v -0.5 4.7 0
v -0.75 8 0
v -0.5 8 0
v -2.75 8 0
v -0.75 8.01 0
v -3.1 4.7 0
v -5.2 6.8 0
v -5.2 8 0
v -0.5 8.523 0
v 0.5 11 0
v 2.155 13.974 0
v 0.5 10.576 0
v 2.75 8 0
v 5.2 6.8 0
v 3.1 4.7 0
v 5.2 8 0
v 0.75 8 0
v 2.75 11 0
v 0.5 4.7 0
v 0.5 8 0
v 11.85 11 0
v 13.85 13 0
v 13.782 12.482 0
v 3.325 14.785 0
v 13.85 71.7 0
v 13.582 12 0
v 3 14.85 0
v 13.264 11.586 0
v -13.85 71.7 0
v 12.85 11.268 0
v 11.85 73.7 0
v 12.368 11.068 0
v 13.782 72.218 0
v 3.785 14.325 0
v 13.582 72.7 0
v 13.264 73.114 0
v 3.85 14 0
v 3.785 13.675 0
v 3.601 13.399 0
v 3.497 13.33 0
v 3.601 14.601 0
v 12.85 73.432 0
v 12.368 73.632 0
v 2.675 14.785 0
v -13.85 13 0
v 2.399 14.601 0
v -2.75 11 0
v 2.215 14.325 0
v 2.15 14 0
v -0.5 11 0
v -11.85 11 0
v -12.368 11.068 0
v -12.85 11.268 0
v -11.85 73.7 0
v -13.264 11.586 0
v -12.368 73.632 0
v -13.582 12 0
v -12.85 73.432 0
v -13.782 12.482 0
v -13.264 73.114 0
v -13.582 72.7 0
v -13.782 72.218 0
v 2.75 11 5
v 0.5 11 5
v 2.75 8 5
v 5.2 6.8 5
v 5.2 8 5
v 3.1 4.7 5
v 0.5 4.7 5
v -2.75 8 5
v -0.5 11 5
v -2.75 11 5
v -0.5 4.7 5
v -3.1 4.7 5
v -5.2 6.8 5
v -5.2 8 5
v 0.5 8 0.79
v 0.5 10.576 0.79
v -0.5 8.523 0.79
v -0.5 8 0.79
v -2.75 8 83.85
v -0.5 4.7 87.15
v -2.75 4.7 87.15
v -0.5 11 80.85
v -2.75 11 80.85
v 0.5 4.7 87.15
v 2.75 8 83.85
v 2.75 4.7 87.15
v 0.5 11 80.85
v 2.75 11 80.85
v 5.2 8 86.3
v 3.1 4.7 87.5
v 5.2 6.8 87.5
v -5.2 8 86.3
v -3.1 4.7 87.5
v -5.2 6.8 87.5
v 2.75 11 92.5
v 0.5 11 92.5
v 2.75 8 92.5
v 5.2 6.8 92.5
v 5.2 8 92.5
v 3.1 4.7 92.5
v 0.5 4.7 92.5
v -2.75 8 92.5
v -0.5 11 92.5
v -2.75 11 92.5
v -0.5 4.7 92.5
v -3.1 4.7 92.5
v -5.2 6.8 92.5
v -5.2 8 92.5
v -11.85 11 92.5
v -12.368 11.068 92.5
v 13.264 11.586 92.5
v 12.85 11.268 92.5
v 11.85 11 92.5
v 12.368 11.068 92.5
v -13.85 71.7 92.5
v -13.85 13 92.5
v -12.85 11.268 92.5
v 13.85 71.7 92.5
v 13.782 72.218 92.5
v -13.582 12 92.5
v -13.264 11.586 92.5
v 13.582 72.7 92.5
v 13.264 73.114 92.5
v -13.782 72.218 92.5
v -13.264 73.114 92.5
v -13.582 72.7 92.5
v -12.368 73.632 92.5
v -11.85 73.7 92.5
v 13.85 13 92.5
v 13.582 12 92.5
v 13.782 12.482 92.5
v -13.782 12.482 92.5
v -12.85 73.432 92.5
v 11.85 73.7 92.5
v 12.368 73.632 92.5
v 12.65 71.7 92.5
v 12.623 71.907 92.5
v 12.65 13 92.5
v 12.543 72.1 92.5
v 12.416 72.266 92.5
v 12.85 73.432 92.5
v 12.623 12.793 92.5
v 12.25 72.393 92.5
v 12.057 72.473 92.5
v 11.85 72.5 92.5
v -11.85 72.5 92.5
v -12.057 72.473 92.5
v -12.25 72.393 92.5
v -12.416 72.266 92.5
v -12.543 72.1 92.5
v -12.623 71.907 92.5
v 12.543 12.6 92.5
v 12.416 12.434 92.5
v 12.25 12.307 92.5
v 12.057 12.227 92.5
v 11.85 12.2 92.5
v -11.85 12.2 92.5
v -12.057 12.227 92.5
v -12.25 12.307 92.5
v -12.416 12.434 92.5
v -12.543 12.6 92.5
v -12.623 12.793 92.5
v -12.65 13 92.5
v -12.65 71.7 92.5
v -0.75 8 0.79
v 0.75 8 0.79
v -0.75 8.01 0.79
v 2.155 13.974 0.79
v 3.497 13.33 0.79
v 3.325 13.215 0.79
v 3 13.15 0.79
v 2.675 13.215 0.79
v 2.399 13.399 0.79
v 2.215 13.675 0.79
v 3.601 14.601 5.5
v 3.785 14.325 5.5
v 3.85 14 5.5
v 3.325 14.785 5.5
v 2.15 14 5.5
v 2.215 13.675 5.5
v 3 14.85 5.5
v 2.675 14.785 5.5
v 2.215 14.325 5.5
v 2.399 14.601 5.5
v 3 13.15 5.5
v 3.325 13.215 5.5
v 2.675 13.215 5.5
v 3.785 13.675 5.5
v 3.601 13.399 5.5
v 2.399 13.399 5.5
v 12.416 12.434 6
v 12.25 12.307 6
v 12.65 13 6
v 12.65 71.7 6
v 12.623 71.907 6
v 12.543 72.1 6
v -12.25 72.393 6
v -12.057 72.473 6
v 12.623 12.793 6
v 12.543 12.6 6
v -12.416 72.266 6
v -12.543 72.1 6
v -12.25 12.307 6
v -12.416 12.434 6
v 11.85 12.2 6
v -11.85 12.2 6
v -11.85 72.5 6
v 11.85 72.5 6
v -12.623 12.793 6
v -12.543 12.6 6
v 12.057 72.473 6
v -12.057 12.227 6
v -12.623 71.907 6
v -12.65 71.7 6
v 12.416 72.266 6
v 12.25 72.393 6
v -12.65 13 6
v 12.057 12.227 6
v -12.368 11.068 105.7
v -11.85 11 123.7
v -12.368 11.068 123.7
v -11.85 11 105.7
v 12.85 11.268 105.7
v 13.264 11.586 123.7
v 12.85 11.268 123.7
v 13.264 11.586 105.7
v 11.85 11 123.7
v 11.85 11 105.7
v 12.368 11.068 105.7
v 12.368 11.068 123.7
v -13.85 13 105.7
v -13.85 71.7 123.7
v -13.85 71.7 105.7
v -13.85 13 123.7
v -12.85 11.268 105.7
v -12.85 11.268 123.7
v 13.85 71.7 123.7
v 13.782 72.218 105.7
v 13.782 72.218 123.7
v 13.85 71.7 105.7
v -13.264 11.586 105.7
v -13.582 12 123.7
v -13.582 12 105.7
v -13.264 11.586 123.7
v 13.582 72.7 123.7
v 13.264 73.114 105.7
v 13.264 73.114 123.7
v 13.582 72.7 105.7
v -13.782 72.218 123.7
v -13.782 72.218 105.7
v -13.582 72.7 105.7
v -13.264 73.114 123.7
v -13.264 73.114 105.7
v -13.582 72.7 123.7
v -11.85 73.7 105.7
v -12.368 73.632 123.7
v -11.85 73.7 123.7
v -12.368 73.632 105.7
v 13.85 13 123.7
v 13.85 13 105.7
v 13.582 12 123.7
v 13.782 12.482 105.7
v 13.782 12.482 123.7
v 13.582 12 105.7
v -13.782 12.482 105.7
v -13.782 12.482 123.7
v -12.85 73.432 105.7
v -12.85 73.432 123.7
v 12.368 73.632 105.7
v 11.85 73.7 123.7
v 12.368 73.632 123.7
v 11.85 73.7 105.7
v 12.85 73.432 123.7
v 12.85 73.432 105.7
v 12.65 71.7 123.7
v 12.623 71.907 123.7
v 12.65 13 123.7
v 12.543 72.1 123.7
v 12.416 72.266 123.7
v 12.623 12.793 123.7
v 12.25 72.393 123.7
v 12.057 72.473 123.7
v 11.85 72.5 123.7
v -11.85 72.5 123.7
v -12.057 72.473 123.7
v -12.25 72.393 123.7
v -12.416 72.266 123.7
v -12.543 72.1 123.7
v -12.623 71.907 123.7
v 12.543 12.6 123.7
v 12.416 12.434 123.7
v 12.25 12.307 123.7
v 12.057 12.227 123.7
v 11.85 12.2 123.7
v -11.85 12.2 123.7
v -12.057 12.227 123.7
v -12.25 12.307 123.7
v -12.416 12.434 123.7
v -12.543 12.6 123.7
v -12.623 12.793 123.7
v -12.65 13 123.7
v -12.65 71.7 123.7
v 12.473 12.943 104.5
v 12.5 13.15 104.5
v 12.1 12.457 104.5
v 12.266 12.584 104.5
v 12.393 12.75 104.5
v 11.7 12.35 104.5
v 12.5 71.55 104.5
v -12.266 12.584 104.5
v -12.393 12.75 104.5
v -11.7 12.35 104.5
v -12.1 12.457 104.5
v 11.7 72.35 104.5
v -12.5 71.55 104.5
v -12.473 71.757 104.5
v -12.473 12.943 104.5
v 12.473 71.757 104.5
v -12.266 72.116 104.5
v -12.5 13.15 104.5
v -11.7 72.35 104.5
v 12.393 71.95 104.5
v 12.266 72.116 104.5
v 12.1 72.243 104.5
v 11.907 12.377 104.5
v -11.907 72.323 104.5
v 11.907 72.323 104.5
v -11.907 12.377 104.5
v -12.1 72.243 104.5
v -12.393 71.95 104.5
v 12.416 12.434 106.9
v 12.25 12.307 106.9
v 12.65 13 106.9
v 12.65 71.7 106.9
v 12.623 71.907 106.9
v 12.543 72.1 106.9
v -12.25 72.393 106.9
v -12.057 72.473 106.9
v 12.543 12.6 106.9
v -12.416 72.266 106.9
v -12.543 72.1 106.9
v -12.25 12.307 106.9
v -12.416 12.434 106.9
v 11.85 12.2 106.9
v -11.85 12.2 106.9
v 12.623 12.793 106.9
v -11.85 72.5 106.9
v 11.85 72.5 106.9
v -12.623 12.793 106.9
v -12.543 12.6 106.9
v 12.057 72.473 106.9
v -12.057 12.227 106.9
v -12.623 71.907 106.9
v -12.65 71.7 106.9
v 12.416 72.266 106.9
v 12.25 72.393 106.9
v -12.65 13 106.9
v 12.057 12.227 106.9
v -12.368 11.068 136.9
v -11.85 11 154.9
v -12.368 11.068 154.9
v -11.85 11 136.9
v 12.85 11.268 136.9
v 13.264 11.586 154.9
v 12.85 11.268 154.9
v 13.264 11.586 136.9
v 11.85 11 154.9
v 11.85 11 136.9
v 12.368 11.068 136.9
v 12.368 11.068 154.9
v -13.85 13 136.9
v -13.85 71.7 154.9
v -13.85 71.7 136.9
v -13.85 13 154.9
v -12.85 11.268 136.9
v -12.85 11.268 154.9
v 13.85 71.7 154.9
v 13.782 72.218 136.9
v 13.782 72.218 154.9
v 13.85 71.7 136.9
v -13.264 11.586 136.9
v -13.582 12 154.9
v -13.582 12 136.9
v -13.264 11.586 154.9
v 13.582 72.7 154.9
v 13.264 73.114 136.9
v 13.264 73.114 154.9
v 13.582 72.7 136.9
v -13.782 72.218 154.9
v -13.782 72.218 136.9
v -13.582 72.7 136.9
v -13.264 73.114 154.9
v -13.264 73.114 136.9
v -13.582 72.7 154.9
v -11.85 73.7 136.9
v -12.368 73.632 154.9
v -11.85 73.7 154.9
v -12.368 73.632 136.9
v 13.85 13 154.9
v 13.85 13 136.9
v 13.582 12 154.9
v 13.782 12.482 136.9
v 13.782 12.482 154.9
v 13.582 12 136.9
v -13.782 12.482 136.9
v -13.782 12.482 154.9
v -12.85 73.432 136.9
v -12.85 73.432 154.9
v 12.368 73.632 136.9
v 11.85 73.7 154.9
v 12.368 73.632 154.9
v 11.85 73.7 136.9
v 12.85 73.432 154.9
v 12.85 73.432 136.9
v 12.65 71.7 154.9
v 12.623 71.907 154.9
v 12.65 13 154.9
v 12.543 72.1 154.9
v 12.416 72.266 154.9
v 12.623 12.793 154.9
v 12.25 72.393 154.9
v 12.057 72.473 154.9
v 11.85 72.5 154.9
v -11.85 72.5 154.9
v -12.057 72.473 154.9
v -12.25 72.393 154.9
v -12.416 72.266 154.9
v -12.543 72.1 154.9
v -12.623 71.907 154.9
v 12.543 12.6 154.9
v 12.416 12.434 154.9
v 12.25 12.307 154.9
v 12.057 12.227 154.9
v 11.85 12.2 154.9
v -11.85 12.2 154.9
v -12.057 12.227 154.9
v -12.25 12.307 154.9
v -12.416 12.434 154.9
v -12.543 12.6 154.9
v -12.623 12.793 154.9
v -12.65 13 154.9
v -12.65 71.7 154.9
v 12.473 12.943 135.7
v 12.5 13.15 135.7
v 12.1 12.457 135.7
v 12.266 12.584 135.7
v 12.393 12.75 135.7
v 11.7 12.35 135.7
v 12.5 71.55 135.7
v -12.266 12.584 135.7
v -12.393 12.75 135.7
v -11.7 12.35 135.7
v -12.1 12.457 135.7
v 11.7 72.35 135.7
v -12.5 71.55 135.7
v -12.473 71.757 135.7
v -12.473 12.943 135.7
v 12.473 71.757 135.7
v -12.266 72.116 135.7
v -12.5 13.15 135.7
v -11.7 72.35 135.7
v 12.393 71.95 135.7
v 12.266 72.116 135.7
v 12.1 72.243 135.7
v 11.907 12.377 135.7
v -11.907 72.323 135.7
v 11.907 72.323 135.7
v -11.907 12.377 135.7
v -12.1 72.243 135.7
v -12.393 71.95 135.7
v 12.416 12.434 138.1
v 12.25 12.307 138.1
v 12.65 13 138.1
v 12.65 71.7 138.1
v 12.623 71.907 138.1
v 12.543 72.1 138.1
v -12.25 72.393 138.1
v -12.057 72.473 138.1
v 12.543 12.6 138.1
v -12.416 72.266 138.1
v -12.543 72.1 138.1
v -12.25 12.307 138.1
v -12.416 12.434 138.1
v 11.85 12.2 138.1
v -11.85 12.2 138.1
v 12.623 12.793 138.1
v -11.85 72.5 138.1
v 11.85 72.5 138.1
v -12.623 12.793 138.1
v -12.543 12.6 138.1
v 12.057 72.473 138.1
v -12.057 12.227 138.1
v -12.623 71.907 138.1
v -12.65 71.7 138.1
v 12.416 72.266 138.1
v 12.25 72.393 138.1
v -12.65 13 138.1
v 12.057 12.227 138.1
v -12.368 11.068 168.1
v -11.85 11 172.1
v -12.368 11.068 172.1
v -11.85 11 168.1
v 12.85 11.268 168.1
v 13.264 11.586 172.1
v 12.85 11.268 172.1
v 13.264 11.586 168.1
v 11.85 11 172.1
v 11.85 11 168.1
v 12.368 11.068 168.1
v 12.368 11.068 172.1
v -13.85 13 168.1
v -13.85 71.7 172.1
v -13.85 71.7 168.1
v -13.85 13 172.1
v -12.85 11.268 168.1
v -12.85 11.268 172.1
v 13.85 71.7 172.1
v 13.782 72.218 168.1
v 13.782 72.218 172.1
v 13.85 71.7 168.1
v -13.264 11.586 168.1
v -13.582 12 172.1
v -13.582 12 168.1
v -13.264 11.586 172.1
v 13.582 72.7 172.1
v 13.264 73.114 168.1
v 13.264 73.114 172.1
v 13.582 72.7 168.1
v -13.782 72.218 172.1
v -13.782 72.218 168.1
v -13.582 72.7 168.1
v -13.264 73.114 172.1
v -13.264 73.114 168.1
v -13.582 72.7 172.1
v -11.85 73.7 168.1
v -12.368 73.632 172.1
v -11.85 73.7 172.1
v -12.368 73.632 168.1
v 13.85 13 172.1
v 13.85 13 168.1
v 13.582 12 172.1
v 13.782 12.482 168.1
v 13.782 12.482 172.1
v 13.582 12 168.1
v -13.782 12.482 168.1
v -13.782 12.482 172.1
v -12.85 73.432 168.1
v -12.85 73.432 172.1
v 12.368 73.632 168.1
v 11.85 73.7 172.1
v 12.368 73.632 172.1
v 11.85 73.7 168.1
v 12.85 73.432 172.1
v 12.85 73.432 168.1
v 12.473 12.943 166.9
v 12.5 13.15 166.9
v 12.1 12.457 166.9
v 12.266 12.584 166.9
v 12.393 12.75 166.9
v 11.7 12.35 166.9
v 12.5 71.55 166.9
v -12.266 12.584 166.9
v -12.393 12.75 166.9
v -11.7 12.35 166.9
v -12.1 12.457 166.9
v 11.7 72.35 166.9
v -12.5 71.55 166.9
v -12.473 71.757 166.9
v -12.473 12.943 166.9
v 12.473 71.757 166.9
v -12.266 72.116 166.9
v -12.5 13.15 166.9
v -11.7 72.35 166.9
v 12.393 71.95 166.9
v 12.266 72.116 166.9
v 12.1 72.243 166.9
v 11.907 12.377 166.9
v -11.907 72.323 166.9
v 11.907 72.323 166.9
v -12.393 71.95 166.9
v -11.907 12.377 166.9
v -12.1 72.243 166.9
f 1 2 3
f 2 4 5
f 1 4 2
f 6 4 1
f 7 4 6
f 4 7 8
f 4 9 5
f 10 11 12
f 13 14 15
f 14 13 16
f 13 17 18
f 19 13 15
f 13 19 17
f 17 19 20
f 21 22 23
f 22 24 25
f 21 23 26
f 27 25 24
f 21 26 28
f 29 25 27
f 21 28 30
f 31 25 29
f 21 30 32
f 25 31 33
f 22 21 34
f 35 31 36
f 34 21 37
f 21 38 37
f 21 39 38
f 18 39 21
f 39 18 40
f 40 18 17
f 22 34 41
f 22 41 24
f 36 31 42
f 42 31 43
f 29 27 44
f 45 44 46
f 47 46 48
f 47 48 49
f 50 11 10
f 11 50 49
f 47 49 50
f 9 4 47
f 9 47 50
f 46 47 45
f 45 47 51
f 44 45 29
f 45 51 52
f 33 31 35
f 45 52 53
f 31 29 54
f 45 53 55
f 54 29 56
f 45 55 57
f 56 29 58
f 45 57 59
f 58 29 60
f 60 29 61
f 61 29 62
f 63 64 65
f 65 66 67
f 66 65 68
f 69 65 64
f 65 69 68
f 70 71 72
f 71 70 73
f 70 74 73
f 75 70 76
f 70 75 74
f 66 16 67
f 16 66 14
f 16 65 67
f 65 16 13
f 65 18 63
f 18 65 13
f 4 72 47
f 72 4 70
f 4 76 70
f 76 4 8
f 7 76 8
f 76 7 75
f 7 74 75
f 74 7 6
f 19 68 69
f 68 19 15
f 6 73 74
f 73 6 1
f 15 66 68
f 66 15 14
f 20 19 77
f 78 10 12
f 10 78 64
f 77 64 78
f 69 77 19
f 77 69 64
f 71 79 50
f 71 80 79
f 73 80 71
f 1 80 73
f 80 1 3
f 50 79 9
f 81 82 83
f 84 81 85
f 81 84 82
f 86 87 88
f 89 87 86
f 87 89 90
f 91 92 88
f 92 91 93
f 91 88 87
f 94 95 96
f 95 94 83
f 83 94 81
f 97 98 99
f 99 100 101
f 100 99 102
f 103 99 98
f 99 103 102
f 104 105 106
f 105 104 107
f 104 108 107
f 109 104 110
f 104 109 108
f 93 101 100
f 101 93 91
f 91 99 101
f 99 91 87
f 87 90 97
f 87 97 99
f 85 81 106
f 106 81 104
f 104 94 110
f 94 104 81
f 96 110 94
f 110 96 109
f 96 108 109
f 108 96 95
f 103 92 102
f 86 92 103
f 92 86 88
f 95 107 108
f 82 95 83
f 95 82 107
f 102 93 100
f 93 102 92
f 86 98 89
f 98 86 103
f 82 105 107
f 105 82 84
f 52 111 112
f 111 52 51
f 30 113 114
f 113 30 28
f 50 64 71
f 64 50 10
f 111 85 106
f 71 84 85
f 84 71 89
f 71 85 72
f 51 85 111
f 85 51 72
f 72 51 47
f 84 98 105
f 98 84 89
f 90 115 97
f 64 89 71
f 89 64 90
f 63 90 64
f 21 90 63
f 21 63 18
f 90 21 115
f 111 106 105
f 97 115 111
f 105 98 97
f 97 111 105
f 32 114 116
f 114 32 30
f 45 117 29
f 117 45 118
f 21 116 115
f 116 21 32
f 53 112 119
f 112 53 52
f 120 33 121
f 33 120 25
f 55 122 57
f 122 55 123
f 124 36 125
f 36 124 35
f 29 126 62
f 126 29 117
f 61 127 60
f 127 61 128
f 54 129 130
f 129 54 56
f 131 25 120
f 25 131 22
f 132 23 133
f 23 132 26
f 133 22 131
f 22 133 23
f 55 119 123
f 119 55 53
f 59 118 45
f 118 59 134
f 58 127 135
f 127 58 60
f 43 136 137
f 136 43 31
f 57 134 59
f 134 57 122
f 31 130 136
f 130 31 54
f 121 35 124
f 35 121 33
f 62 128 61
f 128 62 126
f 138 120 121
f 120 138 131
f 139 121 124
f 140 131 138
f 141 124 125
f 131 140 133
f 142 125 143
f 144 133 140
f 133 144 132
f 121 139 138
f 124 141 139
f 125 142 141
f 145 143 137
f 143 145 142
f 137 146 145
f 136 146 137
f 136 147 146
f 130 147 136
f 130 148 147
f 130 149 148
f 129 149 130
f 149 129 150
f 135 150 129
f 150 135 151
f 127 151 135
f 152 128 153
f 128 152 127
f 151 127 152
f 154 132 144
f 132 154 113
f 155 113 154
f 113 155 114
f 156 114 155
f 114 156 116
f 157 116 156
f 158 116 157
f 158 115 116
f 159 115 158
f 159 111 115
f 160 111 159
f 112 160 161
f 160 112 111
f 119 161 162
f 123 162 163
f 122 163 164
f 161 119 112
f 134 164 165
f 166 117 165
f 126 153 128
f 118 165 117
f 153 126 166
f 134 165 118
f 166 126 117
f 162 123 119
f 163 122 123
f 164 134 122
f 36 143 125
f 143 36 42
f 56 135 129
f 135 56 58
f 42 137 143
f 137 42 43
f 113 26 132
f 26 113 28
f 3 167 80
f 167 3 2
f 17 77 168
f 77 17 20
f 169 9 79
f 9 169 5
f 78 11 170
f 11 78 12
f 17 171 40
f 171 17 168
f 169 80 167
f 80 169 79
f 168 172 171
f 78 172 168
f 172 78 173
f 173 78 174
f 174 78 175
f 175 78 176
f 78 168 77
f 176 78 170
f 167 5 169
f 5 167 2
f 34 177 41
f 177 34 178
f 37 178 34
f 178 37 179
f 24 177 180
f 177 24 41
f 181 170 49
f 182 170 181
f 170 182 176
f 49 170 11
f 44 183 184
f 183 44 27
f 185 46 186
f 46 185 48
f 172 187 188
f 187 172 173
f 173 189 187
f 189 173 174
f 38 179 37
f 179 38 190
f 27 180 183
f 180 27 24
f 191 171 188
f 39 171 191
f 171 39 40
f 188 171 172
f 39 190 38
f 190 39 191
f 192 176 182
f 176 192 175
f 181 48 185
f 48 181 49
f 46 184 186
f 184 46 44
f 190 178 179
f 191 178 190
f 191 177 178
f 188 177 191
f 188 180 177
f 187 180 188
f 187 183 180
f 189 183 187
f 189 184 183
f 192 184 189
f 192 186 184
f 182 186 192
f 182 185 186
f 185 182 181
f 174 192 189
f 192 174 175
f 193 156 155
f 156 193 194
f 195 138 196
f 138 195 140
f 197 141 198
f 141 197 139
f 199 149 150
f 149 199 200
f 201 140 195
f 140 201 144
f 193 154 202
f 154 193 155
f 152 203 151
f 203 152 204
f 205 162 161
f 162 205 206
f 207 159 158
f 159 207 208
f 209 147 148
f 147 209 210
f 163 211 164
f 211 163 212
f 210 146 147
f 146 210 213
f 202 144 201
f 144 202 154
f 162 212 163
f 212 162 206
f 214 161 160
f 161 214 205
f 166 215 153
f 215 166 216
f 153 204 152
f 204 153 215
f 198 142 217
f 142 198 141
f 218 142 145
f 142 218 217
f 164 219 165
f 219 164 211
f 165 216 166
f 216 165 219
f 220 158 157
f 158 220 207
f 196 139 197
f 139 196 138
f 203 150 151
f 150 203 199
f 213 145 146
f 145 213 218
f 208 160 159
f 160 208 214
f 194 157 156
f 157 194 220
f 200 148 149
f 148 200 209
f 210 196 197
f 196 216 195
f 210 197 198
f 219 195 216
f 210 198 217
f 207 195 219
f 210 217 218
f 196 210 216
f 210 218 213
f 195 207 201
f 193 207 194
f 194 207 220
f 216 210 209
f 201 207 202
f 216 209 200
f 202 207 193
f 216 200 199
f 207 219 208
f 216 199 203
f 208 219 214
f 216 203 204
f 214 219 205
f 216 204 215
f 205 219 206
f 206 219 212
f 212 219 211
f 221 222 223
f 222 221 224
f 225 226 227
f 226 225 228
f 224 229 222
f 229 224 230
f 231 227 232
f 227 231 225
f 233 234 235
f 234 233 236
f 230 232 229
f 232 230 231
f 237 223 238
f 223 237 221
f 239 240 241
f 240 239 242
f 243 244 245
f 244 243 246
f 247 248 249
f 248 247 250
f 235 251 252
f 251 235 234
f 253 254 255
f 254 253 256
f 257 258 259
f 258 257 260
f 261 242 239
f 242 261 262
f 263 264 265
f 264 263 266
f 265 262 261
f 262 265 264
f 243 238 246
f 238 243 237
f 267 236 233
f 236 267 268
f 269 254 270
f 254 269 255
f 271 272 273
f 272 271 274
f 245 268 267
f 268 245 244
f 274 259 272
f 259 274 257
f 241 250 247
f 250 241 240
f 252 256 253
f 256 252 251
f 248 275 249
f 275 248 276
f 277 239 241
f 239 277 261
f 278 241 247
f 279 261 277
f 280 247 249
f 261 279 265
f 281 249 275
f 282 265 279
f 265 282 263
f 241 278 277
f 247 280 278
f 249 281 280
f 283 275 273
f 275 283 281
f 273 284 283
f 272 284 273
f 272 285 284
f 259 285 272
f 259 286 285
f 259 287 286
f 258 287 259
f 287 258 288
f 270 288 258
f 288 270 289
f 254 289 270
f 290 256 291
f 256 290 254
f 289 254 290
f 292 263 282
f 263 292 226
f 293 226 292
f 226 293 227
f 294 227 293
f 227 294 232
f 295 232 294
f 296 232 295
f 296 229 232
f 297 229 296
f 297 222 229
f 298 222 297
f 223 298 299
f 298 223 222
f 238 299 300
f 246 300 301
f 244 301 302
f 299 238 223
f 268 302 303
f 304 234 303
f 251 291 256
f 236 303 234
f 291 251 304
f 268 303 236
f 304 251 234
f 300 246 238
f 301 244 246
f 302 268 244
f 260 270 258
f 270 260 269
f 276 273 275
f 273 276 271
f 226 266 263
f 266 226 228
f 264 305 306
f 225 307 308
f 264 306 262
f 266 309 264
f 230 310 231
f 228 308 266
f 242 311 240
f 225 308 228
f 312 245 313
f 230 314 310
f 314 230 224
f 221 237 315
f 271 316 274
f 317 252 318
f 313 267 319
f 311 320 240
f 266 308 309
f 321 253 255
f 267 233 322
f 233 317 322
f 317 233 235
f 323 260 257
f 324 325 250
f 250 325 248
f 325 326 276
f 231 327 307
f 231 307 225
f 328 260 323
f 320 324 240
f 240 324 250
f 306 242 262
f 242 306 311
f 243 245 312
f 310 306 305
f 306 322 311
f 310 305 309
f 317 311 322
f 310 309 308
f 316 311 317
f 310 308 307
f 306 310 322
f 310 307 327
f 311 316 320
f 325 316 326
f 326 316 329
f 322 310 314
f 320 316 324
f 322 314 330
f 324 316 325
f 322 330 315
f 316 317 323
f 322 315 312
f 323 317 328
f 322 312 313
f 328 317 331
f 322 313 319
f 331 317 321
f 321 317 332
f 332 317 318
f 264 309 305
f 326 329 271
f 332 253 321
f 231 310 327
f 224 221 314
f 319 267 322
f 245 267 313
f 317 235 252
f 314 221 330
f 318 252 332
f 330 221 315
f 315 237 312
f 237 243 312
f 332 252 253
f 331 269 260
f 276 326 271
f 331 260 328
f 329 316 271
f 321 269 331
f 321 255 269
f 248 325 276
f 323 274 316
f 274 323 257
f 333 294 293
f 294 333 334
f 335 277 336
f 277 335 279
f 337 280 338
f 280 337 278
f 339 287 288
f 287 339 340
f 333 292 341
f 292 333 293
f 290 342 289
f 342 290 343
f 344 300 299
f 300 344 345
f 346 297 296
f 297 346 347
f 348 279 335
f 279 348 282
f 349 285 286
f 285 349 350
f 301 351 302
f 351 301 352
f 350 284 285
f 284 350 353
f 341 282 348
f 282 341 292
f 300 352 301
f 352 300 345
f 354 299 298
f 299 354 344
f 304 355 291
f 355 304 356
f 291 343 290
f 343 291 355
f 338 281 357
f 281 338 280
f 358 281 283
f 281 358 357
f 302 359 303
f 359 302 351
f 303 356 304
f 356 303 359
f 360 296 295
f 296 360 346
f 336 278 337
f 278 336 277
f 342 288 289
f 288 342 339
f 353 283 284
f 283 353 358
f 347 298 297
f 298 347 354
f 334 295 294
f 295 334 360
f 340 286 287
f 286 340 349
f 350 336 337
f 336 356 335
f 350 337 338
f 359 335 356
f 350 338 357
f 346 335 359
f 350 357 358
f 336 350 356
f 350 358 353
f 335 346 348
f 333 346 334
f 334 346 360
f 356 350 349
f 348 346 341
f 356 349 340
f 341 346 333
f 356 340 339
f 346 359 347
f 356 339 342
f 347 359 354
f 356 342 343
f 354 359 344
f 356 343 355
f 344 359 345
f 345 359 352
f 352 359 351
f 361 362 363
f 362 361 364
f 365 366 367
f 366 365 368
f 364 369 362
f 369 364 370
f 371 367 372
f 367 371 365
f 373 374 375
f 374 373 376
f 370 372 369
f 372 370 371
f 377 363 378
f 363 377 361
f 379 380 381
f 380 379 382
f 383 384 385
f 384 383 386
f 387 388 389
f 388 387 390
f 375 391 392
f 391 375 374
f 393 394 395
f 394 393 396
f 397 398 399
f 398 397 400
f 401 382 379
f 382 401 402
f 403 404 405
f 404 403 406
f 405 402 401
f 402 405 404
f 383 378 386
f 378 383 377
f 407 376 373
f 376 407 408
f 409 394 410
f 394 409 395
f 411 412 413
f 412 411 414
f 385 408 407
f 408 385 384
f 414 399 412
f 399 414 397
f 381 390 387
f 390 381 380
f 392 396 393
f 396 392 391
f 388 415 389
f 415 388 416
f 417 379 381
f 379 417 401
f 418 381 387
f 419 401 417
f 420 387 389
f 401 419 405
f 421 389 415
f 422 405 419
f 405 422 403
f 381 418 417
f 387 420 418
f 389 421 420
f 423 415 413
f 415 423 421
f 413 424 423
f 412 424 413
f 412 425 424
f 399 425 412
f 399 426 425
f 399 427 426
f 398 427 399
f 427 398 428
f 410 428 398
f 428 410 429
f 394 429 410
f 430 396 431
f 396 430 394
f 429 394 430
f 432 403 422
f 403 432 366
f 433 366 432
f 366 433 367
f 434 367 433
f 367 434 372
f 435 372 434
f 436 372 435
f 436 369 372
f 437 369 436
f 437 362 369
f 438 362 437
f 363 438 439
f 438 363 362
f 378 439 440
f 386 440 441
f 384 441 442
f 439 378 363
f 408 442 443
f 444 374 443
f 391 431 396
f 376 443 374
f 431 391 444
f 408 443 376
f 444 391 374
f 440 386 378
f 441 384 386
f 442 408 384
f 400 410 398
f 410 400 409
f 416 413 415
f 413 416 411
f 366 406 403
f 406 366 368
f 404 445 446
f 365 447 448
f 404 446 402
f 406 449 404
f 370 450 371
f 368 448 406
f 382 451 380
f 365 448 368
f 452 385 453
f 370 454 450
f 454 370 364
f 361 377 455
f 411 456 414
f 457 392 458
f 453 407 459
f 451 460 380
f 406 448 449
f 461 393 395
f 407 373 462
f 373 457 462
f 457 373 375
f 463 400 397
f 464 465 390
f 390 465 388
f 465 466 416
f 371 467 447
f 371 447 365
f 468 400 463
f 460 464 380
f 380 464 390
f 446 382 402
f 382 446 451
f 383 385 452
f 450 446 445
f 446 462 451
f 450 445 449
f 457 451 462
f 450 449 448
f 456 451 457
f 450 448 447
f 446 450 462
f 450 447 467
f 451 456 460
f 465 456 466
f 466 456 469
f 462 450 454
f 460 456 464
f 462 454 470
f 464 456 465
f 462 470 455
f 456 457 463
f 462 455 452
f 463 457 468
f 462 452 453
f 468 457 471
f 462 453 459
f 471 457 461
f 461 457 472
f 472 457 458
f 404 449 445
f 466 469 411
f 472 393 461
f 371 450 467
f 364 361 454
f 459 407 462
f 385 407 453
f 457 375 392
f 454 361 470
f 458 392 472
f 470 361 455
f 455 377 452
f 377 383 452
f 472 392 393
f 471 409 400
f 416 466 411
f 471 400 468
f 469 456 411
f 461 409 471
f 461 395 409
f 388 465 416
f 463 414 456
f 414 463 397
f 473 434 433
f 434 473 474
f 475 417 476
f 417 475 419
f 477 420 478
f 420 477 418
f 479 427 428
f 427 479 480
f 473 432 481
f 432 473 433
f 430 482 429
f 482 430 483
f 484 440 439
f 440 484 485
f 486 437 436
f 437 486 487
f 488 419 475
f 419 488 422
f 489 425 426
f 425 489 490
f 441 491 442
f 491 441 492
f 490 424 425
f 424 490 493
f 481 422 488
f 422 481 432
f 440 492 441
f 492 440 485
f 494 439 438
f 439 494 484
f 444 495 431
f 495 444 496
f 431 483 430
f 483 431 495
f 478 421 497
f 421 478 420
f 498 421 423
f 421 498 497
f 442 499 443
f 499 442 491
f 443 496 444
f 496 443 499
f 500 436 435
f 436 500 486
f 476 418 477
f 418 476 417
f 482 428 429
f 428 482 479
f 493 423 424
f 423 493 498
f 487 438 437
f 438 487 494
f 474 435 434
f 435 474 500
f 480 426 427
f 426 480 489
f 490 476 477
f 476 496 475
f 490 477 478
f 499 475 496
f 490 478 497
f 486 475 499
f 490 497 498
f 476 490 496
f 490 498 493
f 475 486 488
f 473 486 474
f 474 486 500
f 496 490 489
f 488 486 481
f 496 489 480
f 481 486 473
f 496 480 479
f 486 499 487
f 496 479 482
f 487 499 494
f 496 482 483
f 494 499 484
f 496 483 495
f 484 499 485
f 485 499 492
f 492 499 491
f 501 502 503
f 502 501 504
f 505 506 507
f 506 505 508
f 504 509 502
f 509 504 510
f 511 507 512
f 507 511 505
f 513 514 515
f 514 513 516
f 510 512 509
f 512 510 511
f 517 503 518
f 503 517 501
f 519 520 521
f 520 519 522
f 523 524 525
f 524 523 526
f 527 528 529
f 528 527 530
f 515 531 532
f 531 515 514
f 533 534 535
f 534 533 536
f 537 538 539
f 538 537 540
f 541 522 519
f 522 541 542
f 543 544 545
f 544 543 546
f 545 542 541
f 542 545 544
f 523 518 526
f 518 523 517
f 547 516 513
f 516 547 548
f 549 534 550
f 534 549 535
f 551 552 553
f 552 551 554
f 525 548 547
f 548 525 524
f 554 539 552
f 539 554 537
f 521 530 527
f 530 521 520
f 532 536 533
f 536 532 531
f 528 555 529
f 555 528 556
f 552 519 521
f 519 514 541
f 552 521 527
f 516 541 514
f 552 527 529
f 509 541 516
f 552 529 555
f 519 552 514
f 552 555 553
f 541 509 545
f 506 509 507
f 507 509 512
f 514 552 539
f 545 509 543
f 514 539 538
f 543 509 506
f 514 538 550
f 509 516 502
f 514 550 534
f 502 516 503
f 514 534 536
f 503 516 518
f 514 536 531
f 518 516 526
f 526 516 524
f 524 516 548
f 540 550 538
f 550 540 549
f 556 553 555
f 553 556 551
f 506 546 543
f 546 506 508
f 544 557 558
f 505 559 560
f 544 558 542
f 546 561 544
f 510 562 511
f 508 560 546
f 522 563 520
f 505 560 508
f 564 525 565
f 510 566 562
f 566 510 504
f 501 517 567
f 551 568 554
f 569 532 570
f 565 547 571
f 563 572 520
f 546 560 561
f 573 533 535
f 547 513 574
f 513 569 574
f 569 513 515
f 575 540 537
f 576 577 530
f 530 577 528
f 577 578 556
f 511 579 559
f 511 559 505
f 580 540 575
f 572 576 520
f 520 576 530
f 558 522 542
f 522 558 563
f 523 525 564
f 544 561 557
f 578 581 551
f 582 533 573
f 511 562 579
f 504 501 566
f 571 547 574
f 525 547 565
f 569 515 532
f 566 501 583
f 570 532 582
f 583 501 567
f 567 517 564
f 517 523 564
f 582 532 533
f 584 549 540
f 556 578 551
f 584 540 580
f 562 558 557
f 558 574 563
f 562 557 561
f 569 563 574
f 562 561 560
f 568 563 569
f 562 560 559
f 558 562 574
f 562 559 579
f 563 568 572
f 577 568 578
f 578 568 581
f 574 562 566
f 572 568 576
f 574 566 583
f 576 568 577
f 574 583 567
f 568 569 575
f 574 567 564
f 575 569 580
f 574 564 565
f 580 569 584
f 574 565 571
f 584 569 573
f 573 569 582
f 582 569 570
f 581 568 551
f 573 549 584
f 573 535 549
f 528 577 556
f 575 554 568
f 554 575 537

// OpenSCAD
// file: vslot-2020.scad
// OpenBuilds V-Slot 20x20, millimetres.
// Source: ../../datasheets/openbuilds-vslot-20x20.pdf, page 1.
// Open directly for a short inspection sample; `use` for library modules.
sample_length = 60;
section_only = false;

module vslot_2020_profile(corner_radius=0.5, centre_notch=0.2) {
    // Dimensioned features from drawing.
    half_size = 10;
    mouth_half = 9.16/2;
    throat_half = 6.25/2;
    channel_half = 11/2;
    shoulder_y = half_size - 1.80;
    floor_y = shoulder_y - 4.30;
    // 90-degree V: each face has a 45-degree slope.
    throat_y = half_size - (mouth_half-throat_half);
    // Adjacent diagonal cavity walls straddle y=x. Their normal
    // separation is the specified 1.50 mm web thickness.
    diagonal_offset = 1.50/sqrt(2);
    channel_knee_y = channel_half + diagonal_offset;
    floor_half = floor_y - diagonal_offset;

    // Corner radius and tiny floor-centre notch are visually estimated:
    // the PDF depicts them but does not dimension them.
    difference() {
        offset(r=corner_radius,$fn=24)
            square([20-2*corner_radius,20-2*corner_radius],center=true);
        circle(d=4.20,$fn=64);
        for(a=[0:90:270]) rotate(a)
            polygon([
                [-mouth_half,11], [mouth_half,11],
                [mouth_half,half_size], [throat_half,throat_y],
                [throat_half,shoulder_y], [channel_half,shoulder_y],
                [channel_half,channel_knee_y], [floor_half,floor_y],
                [centre_notch,floor_y], [0,floor_y-centre_notch],
                [-centre_notch,floor_y], [-floor_half,floor_y],
                [-channel_half,channel_knee_y], [-channel_half,shoulder_y],
                [-throat_half,shoulder_y], [-throat_half,throat_y],
                [-mouth_half,half_size]
            ]);
    }
}

module vslot_2020(length=500) {
    assert(length>0,"Rail length must be positive");
    linear_extrude(height=length,convexity=10) vslot_2020_profile();
}

if(section_only) vslot_2020_profile();
else color([0.66,0.71,0.75]) vslot_2020(sample_length);
// main file
// Load stack, v7: a master load on the end of the balance line, add-on cells
// on top of it, a lid on top of those, hanging directly behind the spine and
// riding its rear T-slot on two flanged sliders. No guide lines: Matt tried
// them on the rig, 2026-09-19, and no tension competes with the mass.
//
// The master is a thin sleeve round Matt's lead-in-resin block, 25 x 60 x 85
// (insert), or two side by side (insert_n = 2); use_insert = false gives a
// shot box. Every piece is an OPEN box closed by the piece above, which has
// a chamfered foot that drops into the cavity below.
//
// The rail guides the master. Its body stands 1 mm off the rail's rear face,
// and a T slider is attached straight to the front wall at the top and at the
// bottom, 5 mm tall each: a stem through the slot's 6 mm opening and a head
// in the channel behind the lips, slit down the middle so the load line runs
// straight through. Both slide in from the rail's top end, before the spine
// cap goes on. The top one overhangs the wall by 6.3 mm, so its underside is
// tapered at 45 degrees (Matt, 2026-09-20): from the wall out to the tip in y,
// and from the stem's sides out to the head's edges in x, added together, so
// every point of the underside has material within 45 degrees below it and it
// prints with no support. The taper hangs under the 5 mm that captures; it
// bears nothing. The line runs down inside the channel,
// through both slits, out under the master, along a channel in the floor's
// underside to an M2 and is clamped under its head. The master's floor is
// thick enough to hold the screw, which is the only height this costs.
//
// Default view is the pieces in a column with gaps, bottom to top: master,
// cells, lid.
part = "column";   // [column, master, cell, lid, print, stack, test, slide]
// test: one T slider on a short slab, with the line hole and the M2 clamp.
test_d     = 12;
test_w     = 20;
// slide: a T slider slide_h tall on a handle, nothing else, for the sliding
// fit up and down the channel. Prints standing, so the section is true.
slide_h    = 20;
slide_handle = 6;    // behind the front face

rail       = 20;
// Slot numbers as printed and proven: the master's sliders fit and slide on
// the V-slot, 2026-09-20 (Matt: a little white grease). spine-cap.scad has the
// same numbers. The datasheet's V-slot is 6.25 at the throat, 6.1 to the
// floor; the fit rides on the stem and has clearance everywhere else, so the
// difference is not material. Do not retune.
slot_w     = 6.0;    // opening at the face
lip_t      = 1.8;    // face to the underside of the lip
chan_w     = 11;     // channel width just behind the lips
chan_str   = 1.6;    // how far below the lips the channel stays full width, before it angles in at 45
chan_d     = 5.5;    // face to the floor
spine_clr  = 1.0;    // front face to the rail's rear face

use_insert = true;
insert     = [25, 60, 85];   // the block: across, deep, tall
insert_n   = 1;              // blocks side by side across
insert_clr = 0.3;            // total, on each of the three
shot_w     = 40;             // the shot-filled master's section instead
shot_d     = 60;
shot_h     = 80;

slider_h   = 5;      // the top slider: capture only, not a guide
slider_h_bot = 5;    // the bottom slider
top_taper  = true;   // 45 degree underside on the top slider instead of support
cell_h     = 18;
cells      = 2;      // in the column and stack views
lid_t      = 4;
wall       = 1.2;    // three 0.4 mm perimeters
floor_t    = 1.2;    // cells
master_floor = 6;    // the master: holds the M2
foot_h     = 1.2;    // into the cavity below; its 45 degree flare is the wall
foot_clr   = 0.15;   // a side
corner     = 2;

// The T slider.
stem_w     = slot_w - 0.5;   // through the opening, 0.25 a side
head_w     = chan_w - 0.6;   // in the channel, 0.3 a side
head_clr   = 0.2;            // under the lips, and off the floor
slider_slit = 1.0;           // down the middle of each slider, for the line
tie_y      = 14;     // the M2, from the rail centre, up into the master's floor
tie_x      = 3;      // off centre, clear of the slit
m2_hole    = 1.7;    // M2 forms its own thread in PLA
m2_depth   = 5.5;    // a 5 mm screw
channel_w  = 1.5;    // the line across the trap's face, hole to screw
channel_d  = 0.8;
gap        = 12;     // between pieces in the column
$fn = 48;

shot_steel = 4.6; shot_lead = 6.8;
front_y  = rail/2 + spine_clr;
stem_in  = rail/2 - lip_t - head_clr;         // stem reaches to just under the lips
knee_in  = rail/2 - lip_t - chan_str + head_clr;   // where the channel starts angling in
head_in  = rail/2 - chan_d + head_clr;        // head reaches to just off the floor
head_bot = head_w - 2*(knee_in - head_in);    // width at the bottom after the 45 degree taper
line_y   = stem_in;                           // hole centred on the junction
// The taper's height: the underside is z = (front_y - y) + max(0, |x| - stem_w/2),
// highest at the head's outer knees and at its floor corners.
taper_h  = top_taper ? max(front_y - knee_in + (head_w - stem_w)/2, front_y - head_in + (head_bot - stem_w)/2) : 0;
stack_w  = use_insert ? insert_n*insert[0] + insert_clr + 2*wall : shot_w;
box_d    = use_insert ? insert[1] + insert_clr + 2*wall : shot_d;
stack_d  = box_d;
master_h = use_insert ? master_floor + insert[2] + insert_clr + foot_h : shot_h;
box_y    = front_y + box_d/2;
cav_w    = stack_w - 2*wall;
cav_d    = box_d - 2*wall;
master_cav = cav_w*cav_d*(master_h - master_floor - foot_h)/1000;
cell_cav   = cav_w*cav_d*(cell_h - floor_t - foot_h)/1000;
stack_h    = master_h + cells*cell_h + lid_t;
echo(str("master ", stack_w, " x ", stack_d, " x ", master_h, use_insert ? str(", round ", insert_n, " block(s)") :
         str(", ", master_cav, " cm3: ", master_cav*shot_steel, " g steel shot, ", master_cav*shot_lead, " g lead shot")));
echo(str("cell ", cell_cav, " cm3: ", cell_cav*shot_steel, " g steel shot"));
echo(str("stack ", stack_h, " mm tall with ", cells, " cells; budget about 130"));
echo(str("top slider: ", slider_h, " capturing over a ", taper_h, " taper, ", slider_h + taper_h, " tall"));
echo(str("slider: stem ", stem_w, " wide to ", stem_in, " from centre; head ", head_w, " wide to ", knee_in,
         ", then 45 in to ", head_bot, " wide at ", head_in, "; line at ", line_y, ", ", rail/2 - line_y, " inside the face"));
assert(head_bot >= 3, "slider head tapers to nothing: raise head_in or chan_str");
assert(tie_y - m2_hole/2 >= front_y, "M2 in front of the master");
assert(master_floor >= m2_depth + 0.5, "master floor too thin for the M2");
assert(foot_h <= wall, "foot flare steeper than 45 degrees");
assert(cell_h >= floor_t + foot_h + 4, "cell too thin to hold anything");

module rbox(w, d, h, r) { linear_extrude(h) offset(r=r, $fn=24) square([w - 2*r, d - 2*r], center=true); }
module cavity(h, f=floor_t) { translate([0, box_y, f]) rbox(cav_w, cav_d, h, max(corner - wall, 0.5)); }
module foot() {
    translate([0, box_y, 0]) hull() {
        translate([0,0,-foot_h]) rbox(cav_w - 2*foot_clr, cav_d - 2*foot_clr, 0.01, max(corner - wall, 0.5));
        rbox(stack_w, box_d, 0.01, corner);
    }
}
// The T slider, height h: stem from the front face in to under the lips, a
// head full width for the channel's straight part, then 45 degrees in to the
// bottom, which is the shape of a 2020 channel.
// With taper = true the bottom taper_h of it is cut to the 45 degree
// underside, z = (front_y - y) + max(0, |x| - stem_w/2): a wedge rising from the
// wall in y, plus a wedge rising from the stem's sides in x, so a wing is held
// by the stem beside it and the stem by the wall behind it. Three half-spaces.
module slider(h, taper=false) {
    difference() {
        intersection() {
            linear_extrude(h) polygon([
                [-stem_w/2, front_y + 0.01], [-stem_w/2, stem_in], [-head_w/2, stem_in], [-head_w/2, knee_in],
                [-head_bot/2, head_in], [head_bot/2, head_in], [head_w/2, knee_in], [head_w/2, stem_in],
                [stem_w/2, stem_in], [stem_w/2, front_y + 0.01]
            ]);
            if(taper) intersection() {
                halfspace(0, -1, front_y);
                halfspace(1, -1, front_y - stem_w/2);
                halfspace(-1, -1, front_y - stem_w/2);
            }
        }
        translate([-slider_slit/2, head_in - 1, -1]) cube([slider_slit, front_y - head_in + 2, h + 2]);
    }
}
// The solid z >= cx*x + cy*y + c0: a big cube sheared so its floor is that plane.
module halfspace(cx, cy, c0) { multmatrix([[1,0,0,0],[0,1,0,0],[cx,cy,1,c0],[0,0,0,1]]) translate([-50,-50,0]) cube(100); }
// Line termination on the underside: the line comes out of the bottom
// slider's slit at line_y, turns along a channel to the M2 and is clamped
// under its head. Drawn for z = 0 as the face, going +z into the material.
module termination() {
    hull() {
        translate([-channel_w/2, line_y, -0.01]) cube([channel_w, 0.01, channel_d]);
        translate([tie_x, tie_y, -0.01]) cylinder(h=channel_d, d=channel_w, $fn=12);
    }
    translate([tie_x, tie_y, -0.01]) cylinder(h=m2_depth + 0.01, d=m2_hole, $fn=16);
}
module master() {
    difference() {
        union() {
            translate([0, box_y, 0]) rbox(stack_w, box_d, master_h, corner);
            slider(slider_h_bot);
            translate([0,0,master_h - slider_h - taper_h]) slider(slider_h + taper_h, top_taper);
        }
        cavity(master_h, master_floor);
        termination();

    }
}
module cell() {
    difference() {
        union() { translate([0, box_y, 0]) rbox(stack_w, box_d, cell_h, corner); foot(); }
        cavity(cell_h);
    }
}
module lid() { union() { translate([0, box_y, 0]) rbox(stack_w, box_d, lid_t, corner); foot(); } }
module slide_test() {
    difference() {
        union() {
            translate([0, front_y + slide_handle/2, 0]) rbox(test_w, slide_handle, slide_h, corner);
            slider(slide_h);
        }
    }
}
module slider_test() {   // the bottom slider on a slab as thick as the master's floor
    difference() {
        union() {
            translate([0, front_y + test_d/2, 0]) rbox(test_w, test_d, master_floor, corner);
            slider(slider_h);
        }
        termination();
    }
}

use <vslot-2020.scad>
module spine_stub(h) {
    %color([0.66,0.71,0.75]) translate([0,0,-40]) linear_extrude(h + 80) vslot_2020_profile();
    %color([0.1,0.7,0.9]) translate([0, line_y, -5]) cylinder(h=h + 60, d=0.6, $fn=8);
}

if(part == "master") master();
else if(part == "cell") translate([0,0,foot_h]) cell();
else if(part == "lid") translate([0,0,foot_h]) lid();
else if(part == "slide") {
    echo(str("slide: stem ", stem_w, " in a ", slot_w, " opening; head ", head_w, " in an ", chan_w, " channel for ",
             stem_in - knee_in, " under the lips, then 45 in to ", head_bot, " at ", stem_in - head_in, " deep; ",
             head_clr, " off the lips and the floor"));
    slide_test();
}
else if(part == "test") {
    echo(str("test: stem ", stem_w, " in a ", slot_w, " opening, head ", head_w, " in a ", chan_w, " channel, ",
             stem_in - head_in, " thick under ", lip_t, " lips; M2 hole ", m2_hole));
    slider_test();
}
else if(part == "column") {
    master();
    for(i=[0:cells-1]) translate([0,0,master_h + gap + foot_h + i*(cell_h + gap + foot_h)]) cell();
    translate([0,0,master_h + gap + foot_h + cells*(cell_h + gap + foot_h)]) lid();
}
else if(part == "print") {
    translate([-(stack_w + gap), 0, 0]) master();
    translate([0,0,foot_h]) cell();
    translate([stack_w + gap, 0, foot_h]) lid();
}
else if(part == "stack") {
    master();
    for(i=[0:cells-1]) translate([0,0,master_h + i*cell_h]) cell();
    translate([0,0,master_h + cells*cell_h]) lid();
    spine_stub(stack_h);
}
